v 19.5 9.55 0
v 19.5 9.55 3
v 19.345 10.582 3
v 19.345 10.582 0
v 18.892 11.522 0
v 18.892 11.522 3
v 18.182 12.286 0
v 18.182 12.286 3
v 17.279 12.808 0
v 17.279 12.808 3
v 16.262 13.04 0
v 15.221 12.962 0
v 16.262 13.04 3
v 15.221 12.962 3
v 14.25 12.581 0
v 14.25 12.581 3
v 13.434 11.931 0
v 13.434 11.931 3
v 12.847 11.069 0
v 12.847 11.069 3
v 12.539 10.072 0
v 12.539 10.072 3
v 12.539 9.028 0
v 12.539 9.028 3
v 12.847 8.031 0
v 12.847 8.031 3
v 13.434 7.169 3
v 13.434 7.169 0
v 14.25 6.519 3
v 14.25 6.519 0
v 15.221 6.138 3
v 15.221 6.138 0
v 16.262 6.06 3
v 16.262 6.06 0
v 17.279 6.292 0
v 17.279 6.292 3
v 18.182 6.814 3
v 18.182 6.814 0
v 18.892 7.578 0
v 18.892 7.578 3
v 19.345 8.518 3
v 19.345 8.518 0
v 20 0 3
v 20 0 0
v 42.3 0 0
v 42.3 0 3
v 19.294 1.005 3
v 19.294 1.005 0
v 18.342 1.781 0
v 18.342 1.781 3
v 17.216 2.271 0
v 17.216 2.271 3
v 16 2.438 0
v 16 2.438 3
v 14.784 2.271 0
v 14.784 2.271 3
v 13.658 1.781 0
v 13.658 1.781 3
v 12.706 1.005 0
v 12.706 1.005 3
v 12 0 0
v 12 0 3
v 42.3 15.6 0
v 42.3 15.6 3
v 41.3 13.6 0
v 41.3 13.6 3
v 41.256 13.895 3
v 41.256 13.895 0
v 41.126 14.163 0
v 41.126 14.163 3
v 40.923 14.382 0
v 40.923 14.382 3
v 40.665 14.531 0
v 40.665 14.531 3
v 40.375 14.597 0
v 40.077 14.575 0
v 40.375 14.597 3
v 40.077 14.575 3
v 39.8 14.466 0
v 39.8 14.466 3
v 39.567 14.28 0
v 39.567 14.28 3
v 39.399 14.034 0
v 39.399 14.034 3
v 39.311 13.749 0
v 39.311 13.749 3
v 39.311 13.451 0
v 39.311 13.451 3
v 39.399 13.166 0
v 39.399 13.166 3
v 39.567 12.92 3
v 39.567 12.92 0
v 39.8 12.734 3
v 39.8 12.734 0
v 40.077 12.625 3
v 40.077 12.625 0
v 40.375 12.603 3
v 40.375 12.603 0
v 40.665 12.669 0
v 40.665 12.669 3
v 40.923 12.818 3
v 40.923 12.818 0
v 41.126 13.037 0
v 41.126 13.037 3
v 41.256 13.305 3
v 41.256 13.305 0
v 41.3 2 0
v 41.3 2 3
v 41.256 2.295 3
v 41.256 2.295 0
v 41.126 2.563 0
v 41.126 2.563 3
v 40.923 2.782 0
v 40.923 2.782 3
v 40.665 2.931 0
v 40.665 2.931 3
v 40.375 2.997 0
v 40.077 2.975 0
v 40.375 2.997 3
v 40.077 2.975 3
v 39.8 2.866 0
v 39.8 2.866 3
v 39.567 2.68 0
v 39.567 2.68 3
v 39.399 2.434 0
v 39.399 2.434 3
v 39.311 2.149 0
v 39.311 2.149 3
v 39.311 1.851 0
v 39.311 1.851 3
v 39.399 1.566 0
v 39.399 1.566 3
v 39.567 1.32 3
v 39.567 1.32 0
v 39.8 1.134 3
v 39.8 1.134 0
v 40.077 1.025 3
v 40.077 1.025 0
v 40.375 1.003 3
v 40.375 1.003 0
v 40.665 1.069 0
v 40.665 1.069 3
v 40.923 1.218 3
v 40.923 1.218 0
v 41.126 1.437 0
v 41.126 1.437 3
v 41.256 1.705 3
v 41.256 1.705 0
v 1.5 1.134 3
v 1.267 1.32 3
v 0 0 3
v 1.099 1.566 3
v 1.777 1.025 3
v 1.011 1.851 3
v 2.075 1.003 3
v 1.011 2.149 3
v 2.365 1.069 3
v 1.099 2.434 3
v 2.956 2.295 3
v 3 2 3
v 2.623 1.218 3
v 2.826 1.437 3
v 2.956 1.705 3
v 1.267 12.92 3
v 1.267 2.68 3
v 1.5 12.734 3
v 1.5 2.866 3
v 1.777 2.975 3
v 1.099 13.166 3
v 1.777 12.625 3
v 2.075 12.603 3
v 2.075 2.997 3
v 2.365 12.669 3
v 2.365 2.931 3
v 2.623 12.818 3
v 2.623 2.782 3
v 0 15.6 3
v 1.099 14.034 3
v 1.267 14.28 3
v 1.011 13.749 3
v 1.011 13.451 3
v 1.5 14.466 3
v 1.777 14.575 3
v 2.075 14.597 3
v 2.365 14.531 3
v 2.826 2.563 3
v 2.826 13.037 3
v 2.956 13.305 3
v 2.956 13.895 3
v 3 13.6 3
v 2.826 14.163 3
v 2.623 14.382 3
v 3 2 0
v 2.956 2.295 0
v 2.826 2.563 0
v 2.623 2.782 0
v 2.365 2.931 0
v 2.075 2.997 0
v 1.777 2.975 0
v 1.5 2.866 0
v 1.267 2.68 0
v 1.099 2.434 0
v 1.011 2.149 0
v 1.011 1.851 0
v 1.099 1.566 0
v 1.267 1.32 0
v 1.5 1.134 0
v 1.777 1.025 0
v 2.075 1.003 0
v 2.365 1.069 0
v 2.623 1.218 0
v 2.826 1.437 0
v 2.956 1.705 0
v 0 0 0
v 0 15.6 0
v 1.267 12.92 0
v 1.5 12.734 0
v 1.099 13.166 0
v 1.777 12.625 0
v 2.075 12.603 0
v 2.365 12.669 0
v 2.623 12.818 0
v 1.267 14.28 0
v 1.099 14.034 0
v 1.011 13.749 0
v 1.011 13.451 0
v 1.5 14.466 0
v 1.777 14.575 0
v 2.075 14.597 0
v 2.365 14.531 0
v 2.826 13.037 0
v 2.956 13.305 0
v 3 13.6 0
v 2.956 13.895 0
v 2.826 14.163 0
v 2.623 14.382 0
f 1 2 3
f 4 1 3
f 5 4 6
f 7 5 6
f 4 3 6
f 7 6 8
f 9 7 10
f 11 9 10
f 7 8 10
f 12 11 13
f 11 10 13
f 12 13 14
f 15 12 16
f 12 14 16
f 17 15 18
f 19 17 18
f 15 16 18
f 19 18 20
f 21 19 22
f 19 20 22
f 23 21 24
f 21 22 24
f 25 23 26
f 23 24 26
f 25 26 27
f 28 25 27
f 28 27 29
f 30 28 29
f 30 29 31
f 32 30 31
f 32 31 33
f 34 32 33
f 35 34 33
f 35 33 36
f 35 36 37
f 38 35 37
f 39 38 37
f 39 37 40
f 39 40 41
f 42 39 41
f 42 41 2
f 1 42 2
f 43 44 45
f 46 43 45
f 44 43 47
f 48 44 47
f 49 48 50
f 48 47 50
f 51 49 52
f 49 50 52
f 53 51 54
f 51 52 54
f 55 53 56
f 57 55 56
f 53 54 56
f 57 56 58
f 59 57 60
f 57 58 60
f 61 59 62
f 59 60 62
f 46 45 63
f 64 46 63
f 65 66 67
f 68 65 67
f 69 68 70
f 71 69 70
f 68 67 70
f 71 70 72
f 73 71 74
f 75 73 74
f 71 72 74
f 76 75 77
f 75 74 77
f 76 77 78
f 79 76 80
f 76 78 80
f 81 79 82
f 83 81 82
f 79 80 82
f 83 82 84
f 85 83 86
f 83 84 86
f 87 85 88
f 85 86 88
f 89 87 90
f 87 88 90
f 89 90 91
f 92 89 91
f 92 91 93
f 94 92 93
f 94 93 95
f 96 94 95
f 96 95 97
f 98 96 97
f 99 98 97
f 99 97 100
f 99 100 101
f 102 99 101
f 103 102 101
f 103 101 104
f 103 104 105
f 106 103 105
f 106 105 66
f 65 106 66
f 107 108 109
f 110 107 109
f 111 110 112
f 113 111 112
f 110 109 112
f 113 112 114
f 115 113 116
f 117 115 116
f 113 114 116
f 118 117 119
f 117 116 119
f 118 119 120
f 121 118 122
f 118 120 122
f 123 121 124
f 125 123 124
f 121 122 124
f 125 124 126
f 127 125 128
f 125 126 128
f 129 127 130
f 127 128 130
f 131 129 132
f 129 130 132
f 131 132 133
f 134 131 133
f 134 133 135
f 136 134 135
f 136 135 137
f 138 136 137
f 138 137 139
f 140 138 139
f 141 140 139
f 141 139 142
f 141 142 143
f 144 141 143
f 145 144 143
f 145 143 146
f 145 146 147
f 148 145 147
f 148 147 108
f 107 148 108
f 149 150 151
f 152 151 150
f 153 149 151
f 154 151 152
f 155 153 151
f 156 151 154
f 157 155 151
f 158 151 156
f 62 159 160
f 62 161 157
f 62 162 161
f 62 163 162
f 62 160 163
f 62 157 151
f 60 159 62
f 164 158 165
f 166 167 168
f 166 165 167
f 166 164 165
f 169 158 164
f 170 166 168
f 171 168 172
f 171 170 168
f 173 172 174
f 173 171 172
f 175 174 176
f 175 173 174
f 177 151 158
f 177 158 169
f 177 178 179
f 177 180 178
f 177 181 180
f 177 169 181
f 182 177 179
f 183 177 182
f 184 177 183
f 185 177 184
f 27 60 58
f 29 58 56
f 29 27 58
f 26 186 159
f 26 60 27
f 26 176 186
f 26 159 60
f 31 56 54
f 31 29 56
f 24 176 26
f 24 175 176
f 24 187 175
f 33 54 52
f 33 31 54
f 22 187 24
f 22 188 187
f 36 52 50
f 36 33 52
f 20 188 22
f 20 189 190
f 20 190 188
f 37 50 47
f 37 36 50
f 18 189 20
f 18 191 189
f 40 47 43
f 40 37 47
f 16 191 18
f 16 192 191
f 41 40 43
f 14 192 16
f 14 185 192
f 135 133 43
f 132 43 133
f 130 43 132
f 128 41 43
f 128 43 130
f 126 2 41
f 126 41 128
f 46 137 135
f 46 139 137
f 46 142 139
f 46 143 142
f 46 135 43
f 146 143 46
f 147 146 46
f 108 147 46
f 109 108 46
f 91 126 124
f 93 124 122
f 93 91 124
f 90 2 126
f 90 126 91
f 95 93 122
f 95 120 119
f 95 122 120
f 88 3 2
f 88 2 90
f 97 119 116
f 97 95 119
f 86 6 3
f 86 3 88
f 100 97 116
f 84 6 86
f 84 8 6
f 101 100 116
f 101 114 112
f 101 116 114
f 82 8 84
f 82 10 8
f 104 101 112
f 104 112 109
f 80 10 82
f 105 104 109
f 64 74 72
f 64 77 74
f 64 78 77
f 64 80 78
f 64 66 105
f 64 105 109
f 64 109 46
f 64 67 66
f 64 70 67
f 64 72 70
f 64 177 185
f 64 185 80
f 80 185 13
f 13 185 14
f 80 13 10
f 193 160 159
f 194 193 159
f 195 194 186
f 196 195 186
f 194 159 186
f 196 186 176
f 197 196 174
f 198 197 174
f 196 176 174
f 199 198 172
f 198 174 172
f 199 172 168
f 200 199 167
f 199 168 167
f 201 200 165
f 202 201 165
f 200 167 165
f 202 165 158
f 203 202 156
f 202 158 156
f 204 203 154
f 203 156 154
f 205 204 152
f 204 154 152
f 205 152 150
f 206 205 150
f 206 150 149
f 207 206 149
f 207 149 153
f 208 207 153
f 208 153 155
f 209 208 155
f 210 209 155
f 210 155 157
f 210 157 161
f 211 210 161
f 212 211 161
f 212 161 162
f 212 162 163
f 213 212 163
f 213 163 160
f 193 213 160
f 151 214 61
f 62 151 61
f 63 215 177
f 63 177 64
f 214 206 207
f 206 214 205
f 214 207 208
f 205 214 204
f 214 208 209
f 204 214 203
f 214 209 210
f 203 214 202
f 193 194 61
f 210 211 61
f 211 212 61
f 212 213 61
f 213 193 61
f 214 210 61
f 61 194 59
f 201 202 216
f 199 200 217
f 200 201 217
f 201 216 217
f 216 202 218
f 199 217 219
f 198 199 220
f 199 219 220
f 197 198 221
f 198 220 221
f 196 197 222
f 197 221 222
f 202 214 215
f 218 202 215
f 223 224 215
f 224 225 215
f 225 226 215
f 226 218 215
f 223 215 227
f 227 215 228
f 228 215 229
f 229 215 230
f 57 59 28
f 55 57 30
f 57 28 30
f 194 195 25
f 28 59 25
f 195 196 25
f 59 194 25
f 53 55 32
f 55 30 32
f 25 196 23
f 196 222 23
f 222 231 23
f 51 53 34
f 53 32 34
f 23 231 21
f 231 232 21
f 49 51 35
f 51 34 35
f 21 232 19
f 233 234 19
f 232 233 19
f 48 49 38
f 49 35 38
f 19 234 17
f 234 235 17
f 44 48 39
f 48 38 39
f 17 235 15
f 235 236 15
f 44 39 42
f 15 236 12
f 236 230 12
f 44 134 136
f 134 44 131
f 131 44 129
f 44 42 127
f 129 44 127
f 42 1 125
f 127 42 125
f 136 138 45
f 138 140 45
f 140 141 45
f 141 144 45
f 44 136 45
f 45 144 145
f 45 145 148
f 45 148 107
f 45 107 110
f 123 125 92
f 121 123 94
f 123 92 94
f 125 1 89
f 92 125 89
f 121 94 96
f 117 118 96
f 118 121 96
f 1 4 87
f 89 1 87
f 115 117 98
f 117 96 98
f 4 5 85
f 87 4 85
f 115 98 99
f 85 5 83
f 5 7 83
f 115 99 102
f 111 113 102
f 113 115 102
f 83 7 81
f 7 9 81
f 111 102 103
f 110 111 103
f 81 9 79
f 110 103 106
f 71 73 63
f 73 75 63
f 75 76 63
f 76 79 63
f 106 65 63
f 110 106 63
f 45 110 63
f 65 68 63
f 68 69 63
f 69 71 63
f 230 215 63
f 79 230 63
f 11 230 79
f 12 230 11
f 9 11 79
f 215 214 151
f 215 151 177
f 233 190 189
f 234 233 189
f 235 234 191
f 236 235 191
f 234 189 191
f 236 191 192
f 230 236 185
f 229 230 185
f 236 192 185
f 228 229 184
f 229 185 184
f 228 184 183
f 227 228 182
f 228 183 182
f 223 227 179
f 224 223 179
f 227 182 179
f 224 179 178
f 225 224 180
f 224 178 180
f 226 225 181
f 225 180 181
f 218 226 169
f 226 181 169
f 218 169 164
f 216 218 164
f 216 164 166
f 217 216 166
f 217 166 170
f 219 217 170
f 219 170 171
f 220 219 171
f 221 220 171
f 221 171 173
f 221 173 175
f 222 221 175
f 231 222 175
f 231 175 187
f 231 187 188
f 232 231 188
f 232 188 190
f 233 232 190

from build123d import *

# Parameters (mm, degrees)
SKETCH1_W           = 42.3
SKETCH1_H           = 15.6
BOSS_EXTRUDE1_DEPTH = 3
SKETCH2_R           = 1
CUT_EXTRUDE1_DEPTH  = 4
SKETCH3_R           = 3.5
CUT_EXTRUDE2_DEPTH  = 4
CUT_EXTRUDE3_DEPTH  = 4


with BuildPart() as part:
    # Sketch1 → Boss-Extrude1 (new body)
    with BuildSketch(Plane.XY):
        with Locations((21.15, 7.8)):
            Rectangle(SKETCH1_W, SKETCH1_H)
    extrude(amount=BOSS_EXTRUDE1_DEPTH)

    # Sketch2 → Cut-Extrude1 (cut, through all)
    with BuildSketch(Plane.XY.offset(3)):
        with Locations((2, 13.6)):
            Circle(SKETCH2_R)
        with Locations((40.3, 13.6)):
            Circle(SKETCH2_R)
        with Locations((40.3, 2)):
            Circle(SKETCH2_R)
        with Locations((2, 2)):
            Circle(SKETCH2_R)
    extrude(amount=-CUT_EXTRUDE1_DEPTH, mode=Mode.SUBTRACT)

    # Sketch3 → Cut-Extrude2 (cut, through all)
    with BuildSketch(Plane.XY.offset(3)):
        with Locations((16, 9.55)):
            Circle(SKETCH3_R)
    extrude(amount=-CUT_EXTRUDE2_DEPTH, mode=Mode.SUBTRACT)

    # Sketch4 → Cut-Extrude3 (cut, through all)
    with BuildSketch(Plane.XY.offset(3)):
        with BuildLine():
            Line((12, 0), (20, 0))
            ThreePointArc((20, 0), (16, 2.438447187), (12, 0))
        make_face()
    extrude(amount=-CUT_EXTRUDE3_DEPTH, mode=Mode.SUBTRACT)


solid = part.part
